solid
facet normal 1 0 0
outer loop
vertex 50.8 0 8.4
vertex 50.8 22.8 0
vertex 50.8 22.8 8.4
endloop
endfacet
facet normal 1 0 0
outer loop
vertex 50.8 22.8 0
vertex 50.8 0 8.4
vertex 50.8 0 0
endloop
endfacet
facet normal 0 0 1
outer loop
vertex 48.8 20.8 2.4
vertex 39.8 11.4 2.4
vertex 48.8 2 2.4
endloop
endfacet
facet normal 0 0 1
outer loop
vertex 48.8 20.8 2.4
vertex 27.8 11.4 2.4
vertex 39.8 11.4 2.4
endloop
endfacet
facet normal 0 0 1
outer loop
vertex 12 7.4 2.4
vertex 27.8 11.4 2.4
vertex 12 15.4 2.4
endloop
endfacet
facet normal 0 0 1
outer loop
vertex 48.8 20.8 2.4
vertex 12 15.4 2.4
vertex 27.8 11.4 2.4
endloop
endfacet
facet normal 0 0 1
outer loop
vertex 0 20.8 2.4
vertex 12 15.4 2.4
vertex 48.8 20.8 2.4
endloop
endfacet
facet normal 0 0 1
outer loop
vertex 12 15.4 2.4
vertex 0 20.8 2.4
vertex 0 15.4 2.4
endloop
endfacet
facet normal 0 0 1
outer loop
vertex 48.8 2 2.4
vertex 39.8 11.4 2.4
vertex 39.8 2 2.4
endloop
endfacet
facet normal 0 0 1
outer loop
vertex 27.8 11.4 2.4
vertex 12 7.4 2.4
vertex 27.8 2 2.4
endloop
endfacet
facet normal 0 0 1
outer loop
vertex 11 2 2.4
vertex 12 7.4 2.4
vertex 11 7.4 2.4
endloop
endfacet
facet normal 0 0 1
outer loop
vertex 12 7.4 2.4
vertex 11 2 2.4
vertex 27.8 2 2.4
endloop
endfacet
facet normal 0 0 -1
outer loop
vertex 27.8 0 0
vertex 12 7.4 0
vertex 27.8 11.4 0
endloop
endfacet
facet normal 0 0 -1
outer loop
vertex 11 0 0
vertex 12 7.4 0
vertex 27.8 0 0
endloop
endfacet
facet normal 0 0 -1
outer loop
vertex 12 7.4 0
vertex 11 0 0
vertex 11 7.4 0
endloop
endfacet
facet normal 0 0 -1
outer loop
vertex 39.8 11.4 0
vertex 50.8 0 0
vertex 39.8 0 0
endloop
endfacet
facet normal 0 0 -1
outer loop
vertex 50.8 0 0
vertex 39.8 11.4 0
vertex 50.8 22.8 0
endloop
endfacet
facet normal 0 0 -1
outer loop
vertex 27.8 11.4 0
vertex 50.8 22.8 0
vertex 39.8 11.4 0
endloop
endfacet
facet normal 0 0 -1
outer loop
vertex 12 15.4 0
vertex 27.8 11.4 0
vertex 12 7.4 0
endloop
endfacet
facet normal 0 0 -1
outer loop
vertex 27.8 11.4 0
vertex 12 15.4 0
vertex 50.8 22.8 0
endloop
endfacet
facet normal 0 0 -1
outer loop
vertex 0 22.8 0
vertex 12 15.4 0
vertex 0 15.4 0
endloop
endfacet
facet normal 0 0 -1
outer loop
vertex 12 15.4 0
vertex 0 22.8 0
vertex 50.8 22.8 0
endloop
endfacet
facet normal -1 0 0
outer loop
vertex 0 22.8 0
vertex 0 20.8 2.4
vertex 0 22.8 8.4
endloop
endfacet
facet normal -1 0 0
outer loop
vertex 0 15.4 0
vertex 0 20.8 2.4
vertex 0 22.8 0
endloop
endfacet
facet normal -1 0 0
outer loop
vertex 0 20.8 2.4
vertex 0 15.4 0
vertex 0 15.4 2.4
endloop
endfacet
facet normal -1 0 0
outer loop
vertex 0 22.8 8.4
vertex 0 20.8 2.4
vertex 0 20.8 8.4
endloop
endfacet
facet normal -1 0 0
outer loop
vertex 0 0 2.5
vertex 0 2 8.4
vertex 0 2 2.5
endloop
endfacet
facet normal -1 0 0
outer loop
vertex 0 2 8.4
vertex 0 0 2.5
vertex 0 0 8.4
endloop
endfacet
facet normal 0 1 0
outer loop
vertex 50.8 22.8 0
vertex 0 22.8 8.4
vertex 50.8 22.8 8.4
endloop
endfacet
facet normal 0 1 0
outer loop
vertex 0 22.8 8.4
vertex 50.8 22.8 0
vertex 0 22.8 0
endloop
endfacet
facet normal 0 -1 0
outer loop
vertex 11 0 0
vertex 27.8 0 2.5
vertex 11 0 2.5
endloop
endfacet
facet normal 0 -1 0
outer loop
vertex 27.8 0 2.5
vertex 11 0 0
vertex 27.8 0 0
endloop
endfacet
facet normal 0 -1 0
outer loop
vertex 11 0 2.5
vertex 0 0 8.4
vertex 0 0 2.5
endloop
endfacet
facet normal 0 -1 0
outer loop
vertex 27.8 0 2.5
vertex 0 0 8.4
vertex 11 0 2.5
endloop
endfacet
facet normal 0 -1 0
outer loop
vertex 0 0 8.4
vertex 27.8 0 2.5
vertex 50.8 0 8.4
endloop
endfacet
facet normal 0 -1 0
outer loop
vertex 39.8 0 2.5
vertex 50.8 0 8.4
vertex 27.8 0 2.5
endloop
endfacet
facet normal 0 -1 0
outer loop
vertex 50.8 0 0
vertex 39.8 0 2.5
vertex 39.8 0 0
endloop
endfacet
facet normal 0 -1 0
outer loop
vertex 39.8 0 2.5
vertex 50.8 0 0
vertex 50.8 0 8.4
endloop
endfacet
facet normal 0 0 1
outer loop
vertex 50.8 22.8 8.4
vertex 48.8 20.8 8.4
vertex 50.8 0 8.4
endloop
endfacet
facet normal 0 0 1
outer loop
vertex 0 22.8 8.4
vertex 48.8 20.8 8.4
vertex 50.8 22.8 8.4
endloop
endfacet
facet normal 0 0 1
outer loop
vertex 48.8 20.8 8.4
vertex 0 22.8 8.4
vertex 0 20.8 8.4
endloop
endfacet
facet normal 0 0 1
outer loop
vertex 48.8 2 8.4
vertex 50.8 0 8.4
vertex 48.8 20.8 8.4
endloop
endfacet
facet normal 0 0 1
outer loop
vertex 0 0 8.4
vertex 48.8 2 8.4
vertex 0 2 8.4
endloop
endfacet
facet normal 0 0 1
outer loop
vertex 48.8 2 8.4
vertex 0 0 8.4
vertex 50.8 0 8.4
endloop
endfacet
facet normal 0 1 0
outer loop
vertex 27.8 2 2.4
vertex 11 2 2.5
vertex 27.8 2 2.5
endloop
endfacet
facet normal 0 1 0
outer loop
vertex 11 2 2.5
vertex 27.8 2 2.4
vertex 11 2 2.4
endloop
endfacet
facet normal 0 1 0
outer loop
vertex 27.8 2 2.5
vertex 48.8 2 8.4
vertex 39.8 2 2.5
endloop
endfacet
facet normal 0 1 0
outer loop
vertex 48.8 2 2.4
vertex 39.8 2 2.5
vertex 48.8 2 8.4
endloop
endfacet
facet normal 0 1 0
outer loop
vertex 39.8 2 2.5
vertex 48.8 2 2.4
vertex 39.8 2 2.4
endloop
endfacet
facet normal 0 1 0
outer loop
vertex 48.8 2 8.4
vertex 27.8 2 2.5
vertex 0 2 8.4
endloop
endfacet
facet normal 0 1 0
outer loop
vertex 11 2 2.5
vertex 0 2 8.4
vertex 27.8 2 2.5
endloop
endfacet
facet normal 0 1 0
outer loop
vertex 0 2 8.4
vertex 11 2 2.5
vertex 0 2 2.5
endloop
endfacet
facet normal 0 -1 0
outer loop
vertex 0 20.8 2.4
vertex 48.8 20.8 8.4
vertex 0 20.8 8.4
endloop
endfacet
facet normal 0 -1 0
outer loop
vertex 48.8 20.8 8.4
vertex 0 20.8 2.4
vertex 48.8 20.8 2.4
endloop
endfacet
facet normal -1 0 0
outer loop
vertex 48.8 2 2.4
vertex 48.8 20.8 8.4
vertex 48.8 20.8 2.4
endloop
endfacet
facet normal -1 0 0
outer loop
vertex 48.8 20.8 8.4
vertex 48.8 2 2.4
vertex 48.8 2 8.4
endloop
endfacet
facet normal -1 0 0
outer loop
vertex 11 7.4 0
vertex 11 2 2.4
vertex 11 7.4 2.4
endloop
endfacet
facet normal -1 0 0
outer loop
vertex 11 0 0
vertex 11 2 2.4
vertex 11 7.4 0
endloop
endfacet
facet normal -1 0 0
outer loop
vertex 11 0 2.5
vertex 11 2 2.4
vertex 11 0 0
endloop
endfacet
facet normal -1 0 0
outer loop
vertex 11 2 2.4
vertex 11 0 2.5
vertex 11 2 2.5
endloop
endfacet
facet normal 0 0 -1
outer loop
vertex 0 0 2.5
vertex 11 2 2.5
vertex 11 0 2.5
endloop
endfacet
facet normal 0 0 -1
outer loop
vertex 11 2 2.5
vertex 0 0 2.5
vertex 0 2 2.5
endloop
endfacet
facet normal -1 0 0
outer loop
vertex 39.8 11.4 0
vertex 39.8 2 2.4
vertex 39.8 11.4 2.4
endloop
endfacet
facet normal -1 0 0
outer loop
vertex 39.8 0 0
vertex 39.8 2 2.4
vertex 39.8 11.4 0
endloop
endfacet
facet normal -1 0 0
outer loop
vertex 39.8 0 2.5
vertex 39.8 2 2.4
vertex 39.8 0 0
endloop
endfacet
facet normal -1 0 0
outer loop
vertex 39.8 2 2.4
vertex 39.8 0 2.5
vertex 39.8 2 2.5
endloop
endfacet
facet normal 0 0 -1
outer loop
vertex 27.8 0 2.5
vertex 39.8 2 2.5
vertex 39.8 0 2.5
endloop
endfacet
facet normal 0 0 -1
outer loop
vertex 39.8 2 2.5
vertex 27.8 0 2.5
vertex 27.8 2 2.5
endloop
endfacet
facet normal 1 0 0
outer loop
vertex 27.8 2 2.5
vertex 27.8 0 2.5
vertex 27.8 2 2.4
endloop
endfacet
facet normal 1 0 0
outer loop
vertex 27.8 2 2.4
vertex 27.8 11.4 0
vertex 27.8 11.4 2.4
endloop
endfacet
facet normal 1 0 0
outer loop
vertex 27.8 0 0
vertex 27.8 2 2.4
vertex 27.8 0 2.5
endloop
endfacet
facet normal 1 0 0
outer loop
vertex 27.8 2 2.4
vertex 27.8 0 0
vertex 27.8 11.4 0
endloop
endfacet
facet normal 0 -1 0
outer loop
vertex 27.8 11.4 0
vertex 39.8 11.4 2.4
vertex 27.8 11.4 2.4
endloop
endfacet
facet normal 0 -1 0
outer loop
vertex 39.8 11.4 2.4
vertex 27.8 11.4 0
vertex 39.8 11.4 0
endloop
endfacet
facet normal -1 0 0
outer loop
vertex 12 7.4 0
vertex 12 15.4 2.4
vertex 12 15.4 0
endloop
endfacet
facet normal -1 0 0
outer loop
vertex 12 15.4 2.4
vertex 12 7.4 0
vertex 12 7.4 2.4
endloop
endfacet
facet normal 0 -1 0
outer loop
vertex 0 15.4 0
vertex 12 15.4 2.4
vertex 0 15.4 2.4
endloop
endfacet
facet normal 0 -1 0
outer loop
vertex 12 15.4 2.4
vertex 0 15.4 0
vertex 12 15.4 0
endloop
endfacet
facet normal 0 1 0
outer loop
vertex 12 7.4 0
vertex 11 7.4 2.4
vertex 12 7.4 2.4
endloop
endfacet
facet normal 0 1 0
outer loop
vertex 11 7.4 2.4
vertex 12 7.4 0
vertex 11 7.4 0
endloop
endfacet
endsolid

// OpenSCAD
// Parametric tray for the white card reader mounted above the Open Pill case.
// Edit the parameters below to match your measured reader size.

$fn = 48;

reader_len = 46;
reader_w = 18;
reader_h = 8;

clearance = 0.4;
base_th = 2.4;
wall_th = 2.0;
wall_h = 6.0;
back_stop_th = 2.0;

strap_slot_w = 4.0;
strap_slot_len = 12.0;
strap_edge_margin = 5.0;

cable_slot_w = 8.0;
cable_slot_len = 12.0;

mount_pad_len = reader_len + 10;
mount_pad_w = reader_w + 10;

inner_len = reader_len + clearance * 2;
inner_w = reader_w + clearance * 2;

outer_len = inner_len + wall_th * 2;
outer_w = inner_w + wall_th * 2;

module tray_body() {
    union() {
        cube([outer_len, outer_w, base_th]);

        translate([0, 0, base_th])
            cube([outer_len, wall_th, wall_h]);

        translate([0, outer_w - wall_th, base_th])
            cube([outer_len, wall_th, wall_h]);

        translate([outer_len - back_stop_th, wall_th, base_th])
            cube([back_stop_th, inner_w, wall_h]);
    }
}

module strap_slots() {
    for (x = [strap_edge_margin, outer_len - strap_edge_margin - strap_slot_len]) {
        translate([x, -0.1, base_th / 2])
            cube([strap_slot_len, outer_w + 0.2, base_th + 0.2], center = true);
    }
}

module cable_slot() {
    translate([-0.1, (outer_w - cable_slot_w) / 2, -0.1])
        cube([cable_slot_len + 0.1, cable_slot_w, base_th + wall_h + 0.2]);
}

difference() {
    tray_body();
    strap_slots();
    cable_slot();
}
